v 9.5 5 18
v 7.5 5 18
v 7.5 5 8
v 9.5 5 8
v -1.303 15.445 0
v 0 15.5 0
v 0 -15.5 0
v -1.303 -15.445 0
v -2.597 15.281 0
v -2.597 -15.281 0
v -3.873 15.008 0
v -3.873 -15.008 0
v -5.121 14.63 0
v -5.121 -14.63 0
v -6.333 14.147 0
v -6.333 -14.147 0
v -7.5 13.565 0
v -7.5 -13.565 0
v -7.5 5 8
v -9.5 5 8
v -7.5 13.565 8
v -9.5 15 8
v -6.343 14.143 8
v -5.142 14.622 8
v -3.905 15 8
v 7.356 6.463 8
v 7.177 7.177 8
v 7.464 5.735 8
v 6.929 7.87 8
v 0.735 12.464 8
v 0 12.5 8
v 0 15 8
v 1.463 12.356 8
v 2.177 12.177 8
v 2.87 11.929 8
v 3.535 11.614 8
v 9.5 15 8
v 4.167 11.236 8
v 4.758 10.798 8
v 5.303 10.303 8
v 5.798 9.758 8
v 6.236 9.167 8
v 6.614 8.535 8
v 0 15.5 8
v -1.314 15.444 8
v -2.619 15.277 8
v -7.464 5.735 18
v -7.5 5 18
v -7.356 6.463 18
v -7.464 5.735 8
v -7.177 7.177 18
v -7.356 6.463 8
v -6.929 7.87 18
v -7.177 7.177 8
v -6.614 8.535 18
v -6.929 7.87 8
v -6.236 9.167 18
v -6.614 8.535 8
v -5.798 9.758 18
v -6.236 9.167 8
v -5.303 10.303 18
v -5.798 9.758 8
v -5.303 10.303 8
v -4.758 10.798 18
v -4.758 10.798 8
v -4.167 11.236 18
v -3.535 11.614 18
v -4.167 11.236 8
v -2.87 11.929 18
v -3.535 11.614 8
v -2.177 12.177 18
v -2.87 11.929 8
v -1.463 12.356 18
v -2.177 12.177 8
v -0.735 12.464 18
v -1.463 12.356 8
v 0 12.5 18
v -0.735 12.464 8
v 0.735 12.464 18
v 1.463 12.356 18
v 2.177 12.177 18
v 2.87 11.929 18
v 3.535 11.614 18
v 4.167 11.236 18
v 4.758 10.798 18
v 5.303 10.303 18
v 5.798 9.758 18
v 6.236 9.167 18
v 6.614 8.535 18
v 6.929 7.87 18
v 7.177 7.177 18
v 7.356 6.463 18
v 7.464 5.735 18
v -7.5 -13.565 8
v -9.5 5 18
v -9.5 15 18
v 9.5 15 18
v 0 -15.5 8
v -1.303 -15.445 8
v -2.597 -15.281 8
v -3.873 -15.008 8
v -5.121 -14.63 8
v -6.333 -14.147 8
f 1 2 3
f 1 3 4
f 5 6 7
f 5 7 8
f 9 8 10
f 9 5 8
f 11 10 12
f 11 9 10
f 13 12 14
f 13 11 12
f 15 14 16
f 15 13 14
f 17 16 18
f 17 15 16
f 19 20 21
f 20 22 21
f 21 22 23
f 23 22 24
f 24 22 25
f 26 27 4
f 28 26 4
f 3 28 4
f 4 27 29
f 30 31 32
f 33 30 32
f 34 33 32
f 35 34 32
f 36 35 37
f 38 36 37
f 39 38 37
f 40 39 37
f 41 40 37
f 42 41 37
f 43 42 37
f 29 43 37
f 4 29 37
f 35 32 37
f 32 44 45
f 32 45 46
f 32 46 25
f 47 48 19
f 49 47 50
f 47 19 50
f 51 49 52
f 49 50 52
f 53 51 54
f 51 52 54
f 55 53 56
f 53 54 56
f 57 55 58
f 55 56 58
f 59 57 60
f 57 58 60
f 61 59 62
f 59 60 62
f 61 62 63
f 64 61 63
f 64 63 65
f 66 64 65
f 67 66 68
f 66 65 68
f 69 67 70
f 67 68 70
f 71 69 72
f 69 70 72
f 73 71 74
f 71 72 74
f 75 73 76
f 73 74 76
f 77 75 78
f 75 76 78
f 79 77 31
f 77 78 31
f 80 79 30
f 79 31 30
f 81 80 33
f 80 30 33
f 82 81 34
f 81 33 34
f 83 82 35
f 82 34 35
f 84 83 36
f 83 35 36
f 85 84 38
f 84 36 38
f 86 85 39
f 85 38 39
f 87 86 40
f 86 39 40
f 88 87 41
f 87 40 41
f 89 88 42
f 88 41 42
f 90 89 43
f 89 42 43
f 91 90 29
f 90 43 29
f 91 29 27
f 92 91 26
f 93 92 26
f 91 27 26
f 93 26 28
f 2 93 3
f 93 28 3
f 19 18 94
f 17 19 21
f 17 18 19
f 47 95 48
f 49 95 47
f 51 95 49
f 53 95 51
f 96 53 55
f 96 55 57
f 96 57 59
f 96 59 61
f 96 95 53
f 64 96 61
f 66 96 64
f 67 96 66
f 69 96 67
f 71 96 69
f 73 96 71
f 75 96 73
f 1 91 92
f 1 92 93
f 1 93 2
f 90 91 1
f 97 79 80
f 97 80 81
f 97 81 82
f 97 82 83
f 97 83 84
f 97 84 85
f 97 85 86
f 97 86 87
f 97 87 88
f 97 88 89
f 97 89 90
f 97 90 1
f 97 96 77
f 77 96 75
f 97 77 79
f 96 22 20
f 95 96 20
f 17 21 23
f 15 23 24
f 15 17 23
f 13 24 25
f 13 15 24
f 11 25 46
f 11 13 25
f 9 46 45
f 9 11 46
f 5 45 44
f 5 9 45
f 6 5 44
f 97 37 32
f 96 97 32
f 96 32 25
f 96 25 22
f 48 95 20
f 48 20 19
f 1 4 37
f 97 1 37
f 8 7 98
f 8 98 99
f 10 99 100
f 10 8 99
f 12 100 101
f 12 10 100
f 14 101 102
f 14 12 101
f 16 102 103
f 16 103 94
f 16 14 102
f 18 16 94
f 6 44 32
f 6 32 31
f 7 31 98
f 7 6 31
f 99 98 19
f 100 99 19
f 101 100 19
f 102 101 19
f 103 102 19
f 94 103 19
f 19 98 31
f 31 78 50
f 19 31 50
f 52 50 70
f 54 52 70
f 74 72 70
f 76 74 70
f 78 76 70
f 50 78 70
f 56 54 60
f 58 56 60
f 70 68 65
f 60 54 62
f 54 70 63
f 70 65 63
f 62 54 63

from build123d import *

# Parameters (mm, degrees)
EXTRUDE_1_DEPTH = 8
EXTRUDE_2_DEPTH = 10


with BuildPart() as part:
    # 草图1 → 凸台-拉伸1 (new body)
    with BuildSketch(Plane.XY):
        with BuildLine():
            Line((0, 15.5), (0, -15.5))
            ThreePointArc((0, -15.5), (-3.872839431, -15.008368157), (-7.5, -13.564659966))
            Line((-7.5, -13.564659966), (-7.5, 13.564659966))
            ThreePointArc((-7.5, 13.564659966), (-3.872839431, 15.008368157), (0, 15.5))
        make_face()
    extrude(amount=EXTRUDE_1_DEPTH)

    # 草图2 → 凸台-拉伸2 (add)
    with BuildSketch(Plane.XY.offset(8)):
        with BuildLine():
            Line((7.5, 5), (9.5, 5))
            Line((9.5, 5), (9.5, 15))
            Line((9.5, 15), (-9.5, 15))
            Line((-9.5, 15), (-9.5, 5))
            Line((-9.5, 5), (-7.5, 5))
            ThreePointArc((-7.5, 5), (0, 12.5), (7.5, 5))
        make_face()
    extrude(amount=EXTRUDE_2_DEPTH)


solid = part.part
